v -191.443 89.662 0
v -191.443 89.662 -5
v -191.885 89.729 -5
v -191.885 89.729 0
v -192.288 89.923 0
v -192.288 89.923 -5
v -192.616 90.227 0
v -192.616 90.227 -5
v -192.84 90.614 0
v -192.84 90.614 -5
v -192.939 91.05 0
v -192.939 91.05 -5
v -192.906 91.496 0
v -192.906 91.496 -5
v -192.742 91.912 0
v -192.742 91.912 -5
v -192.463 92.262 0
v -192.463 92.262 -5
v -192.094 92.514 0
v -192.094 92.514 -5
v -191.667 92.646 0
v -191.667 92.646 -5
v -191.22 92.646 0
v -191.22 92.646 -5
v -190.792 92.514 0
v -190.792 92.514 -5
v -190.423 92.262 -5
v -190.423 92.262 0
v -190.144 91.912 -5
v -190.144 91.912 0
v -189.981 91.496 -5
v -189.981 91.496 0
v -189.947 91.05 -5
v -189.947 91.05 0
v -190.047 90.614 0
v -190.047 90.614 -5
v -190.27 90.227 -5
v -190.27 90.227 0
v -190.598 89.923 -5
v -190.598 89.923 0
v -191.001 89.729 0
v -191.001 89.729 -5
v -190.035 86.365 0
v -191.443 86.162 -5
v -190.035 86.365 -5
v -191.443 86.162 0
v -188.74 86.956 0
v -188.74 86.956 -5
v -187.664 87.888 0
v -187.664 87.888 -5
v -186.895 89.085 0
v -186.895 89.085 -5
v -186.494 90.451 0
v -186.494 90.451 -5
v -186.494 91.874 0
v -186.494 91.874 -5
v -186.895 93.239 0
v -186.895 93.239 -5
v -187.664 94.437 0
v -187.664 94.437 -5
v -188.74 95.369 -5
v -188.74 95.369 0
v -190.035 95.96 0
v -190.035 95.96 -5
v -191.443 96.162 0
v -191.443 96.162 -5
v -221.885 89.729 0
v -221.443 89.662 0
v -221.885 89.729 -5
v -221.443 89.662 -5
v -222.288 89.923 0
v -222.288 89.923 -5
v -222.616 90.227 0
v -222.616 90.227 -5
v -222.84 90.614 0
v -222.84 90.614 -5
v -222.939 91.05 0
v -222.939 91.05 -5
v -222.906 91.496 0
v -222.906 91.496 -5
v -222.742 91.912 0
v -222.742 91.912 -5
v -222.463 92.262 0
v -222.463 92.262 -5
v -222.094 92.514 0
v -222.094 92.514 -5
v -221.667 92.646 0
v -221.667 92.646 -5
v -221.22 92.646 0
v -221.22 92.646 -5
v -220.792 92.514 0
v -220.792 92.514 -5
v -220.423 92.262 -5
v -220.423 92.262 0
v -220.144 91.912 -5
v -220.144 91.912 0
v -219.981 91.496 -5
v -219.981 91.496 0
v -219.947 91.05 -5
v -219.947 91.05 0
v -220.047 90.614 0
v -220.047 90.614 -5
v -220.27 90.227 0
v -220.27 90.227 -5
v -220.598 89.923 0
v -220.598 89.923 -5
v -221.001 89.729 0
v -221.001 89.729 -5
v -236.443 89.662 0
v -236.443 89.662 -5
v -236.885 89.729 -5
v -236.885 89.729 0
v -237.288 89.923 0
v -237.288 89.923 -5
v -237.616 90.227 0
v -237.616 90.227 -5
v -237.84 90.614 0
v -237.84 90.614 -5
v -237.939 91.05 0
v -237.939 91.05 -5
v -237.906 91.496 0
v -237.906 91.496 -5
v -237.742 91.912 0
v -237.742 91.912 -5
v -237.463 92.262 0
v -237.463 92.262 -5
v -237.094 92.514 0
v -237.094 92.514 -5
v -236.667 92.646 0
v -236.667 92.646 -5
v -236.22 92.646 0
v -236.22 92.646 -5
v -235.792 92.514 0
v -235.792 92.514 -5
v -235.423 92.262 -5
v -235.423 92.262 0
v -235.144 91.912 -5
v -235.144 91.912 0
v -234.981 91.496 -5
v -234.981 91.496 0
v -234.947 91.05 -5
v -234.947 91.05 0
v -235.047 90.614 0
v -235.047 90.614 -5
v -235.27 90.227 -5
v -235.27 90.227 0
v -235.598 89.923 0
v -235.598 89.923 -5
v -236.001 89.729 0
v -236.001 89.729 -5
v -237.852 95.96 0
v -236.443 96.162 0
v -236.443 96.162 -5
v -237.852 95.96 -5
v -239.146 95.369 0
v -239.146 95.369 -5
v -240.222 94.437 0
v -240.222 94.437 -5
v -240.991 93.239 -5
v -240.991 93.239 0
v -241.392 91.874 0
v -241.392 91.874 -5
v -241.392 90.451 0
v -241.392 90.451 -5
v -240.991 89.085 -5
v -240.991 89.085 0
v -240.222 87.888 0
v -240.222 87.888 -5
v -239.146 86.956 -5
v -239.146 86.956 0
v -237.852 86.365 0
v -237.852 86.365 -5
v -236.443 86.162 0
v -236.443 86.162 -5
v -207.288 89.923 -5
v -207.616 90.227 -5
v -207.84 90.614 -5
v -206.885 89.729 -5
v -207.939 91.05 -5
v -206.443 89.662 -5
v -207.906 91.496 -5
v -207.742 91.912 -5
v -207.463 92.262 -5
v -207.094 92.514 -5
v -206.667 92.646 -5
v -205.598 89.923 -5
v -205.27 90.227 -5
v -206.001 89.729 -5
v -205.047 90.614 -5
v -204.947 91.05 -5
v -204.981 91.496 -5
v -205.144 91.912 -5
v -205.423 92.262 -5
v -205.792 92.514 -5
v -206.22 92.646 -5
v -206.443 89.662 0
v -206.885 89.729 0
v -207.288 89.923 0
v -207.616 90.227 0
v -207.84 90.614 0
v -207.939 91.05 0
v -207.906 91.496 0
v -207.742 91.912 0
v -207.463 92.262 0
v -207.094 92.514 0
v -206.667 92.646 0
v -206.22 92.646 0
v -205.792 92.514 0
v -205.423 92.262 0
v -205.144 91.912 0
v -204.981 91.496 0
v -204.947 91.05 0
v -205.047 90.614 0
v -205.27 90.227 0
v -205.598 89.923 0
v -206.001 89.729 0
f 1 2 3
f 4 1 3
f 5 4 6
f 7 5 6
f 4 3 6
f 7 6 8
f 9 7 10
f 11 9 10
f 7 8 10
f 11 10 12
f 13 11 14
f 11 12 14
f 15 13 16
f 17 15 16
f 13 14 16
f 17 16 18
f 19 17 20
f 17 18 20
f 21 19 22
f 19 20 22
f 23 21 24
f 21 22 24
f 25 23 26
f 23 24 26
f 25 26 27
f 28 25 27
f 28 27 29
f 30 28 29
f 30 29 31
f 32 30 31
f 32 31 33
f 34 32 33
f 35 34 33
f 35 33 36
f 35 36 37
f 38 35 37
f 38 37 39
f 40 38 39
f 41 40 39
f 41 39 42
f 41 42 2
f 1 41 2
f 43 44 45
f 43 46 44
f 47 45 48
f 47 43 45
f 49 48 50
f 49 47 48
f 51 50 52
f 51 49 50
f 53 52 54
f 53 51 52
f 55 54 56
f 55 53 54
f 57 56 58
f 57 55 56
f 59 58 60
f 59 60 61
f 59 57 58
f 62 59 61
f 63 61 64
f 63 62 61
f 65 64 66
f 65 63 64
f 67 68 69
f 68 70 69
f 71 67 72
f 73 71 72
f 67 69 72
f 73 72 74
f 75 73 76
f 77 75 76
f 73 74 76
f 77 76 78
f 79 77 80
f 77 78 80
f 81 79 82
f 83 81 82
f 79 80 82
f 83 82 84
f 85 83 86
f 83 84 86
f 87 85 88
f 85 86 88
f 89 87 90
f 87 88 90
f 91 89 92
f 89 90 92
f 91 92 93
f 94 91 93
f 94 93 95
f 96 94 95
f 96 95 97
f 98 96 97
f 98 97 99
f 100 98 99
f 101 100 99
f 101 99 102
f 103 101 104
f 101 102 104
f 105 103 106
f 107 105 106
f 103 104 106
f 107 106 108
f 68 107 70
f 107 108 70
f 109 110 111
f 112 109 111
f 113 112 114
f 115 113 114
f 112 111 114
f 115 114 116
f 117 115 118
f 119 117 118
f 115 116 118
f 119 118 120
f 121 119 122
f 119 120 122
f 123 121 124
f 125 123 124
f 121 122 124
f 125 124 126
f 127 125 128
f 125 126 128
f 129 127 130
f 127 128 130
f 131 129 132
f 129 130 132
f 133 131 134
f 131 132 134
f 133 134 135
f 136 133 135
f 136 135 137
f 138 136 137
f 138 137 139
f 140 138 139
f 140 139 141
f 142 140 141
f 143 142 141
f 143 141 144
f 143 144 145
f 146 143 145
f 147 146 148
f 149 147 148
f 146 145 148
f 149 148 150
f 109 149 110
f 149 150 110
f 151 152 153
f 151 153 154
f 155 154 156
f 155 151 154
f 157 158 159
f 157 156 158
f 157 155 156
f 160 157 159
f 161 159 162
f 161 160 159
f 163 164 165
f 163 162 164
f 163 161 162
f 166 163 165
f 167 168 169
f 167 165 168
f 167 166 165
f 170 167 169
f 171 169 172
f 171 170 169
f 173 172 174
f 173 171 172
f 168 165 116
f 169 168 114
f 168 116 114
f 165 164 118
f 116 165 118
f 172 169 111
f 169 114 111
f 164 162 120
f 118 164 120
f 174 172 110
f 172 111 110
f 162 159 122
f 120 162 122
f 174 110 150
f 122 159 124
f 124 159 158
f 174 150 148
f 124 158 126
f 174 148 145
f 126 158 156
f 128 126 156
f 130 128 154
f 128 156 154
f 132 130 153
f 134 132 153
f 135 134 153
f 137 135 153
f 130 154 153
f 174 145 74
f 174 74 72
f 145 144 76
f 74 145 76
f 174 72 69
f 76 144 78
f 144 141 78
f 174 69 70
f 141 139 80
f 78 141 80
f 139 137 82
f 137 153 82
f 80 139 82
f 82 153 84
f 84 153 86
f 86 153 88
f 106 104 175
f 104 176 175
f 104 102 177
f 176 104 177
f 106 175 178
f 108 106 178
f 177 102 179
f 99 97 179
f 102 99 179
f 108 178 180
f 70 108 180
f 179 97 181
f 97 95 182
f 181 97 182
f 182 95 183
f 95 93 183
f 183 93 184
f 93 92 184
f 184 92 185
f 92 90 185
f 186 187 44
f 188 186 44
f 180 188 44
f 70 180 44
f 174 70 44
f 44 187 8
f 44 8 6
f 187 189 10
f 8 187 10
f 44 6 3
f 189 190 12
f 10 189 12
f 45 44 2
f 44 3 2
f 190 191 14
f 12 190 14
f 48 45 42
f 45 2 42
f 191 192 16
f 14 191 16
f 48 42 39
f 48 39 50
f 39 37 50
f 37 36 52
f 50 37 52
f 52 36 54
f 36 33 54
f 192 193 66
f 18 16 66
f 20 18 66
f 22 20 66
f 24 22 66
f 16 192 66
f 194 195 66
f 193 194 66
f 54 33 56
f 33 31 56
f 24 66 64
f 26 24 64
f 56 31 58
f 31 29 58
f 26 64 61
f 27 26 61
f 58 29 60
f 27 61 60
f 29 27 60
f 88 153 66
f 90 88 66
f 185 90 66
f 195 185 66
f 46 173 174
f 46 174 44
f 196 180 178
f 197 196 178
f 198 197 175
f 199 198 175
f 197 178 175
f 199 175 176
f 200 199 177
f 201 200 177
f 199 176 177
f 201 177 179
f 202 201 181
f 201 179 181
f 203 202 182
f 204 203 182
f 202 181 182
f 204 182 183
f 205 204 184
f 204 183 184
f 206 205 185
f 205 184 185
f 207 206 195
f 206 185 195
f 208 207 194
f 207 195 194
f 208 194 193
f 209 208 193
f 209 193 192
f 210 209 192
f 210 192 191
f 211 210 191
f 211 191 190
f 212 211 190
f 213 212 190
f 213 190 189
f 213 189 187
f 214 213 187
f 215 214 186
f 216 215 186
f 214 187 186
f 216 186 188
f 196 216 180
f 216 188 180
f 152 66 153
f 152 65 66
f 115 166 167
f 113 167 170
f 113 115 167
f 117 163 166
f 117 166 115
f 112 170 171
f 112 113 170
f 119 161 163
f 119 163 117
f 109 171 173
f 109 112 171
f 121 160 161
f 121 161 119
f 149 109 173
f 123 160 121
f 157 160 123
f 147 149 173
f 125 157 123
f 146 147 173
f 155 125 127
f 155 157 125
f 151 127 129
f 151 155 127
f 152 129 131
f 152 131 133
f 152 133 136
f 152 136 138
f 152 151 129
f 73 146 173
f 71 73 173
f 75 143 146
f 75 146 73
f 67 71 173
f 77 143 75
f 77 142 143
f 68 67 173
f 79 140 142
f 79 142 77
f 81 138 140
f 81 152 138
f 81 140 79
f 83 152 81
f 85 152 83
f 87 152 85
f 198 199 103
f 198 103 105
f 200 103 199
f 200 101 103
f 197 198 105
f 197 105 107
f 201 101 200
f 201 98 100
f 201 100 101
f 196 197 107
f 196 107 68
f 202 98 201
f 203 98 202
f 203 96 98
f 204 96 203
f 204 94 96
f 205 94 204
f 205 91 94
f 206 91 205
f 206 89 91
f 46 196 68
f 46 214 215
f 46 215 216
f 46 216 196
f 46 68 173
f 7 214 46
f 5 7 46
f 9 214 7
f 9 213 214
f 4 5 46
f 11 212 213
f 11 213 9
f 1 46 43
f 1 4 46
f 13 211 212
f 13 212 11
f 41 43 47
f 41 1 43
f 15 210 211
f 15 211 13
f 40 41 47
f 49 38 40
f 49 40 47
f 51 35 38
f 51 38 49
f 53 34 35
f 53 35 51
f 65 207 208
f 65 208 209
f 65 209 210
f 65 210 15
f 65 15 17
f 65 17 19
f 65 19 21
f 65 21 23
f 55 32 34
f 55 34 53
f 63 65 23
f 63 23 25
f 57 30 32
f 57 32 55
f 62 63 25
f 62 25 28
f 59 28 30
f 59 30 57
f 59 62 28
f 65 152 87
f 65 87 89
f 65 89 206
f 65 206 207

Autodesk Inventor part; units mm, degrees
ref_plane "YZ Plane" through (0, 0, 0) normal (1, 0, 0) x (0, 1, 0)
ref_plane "XZ Plane" through (0, 0, 0) normal (0, 1, 0) x (-1, 0, 0)
ref_plane "XY Plane" through (0, 0, 0) normal (0, 0, 1) x (1, 0, 0)
sketch "スケッチ1" plane through (0, 0, 0) normal (0, 0, 1) x (1, 0, 0)
  circle A0 centre (-137.47813, 108.715013) radius 1.5
  circle A1 centre (-137.47813, 108.715013) radius 4
  circle A2 centre (-84.833891, 108.084965) radius 1.5
  circle A3 centre (-84.833891, 108.084965) radius 4
  arc A4 (-118.947299, 71.123436) -> (-117.73095, 71.382243) centre (-118.502117, 72.018876) ccw
  arc A5 (-114.600271, 73.907195) -> (-117.73095, 71.382243) centre (-110, 65) ccw
  arc A6 (-114.600271, 73.907195) -> (-114.089743, 75.041147) centre (-115.059151, 74.795694) ccw
  line L0 (-114.089743, 75.041147) -> (-119.33341, 95.750821)
  arc A7 (-119.33341, 95.750821) -> (-120.080809, 96.480412) centre (-120.302818, 95.505368) ccw
  arc A8 (-121.730917, 97.23053) -> (-120.080809, 96.480412) centre (-119.081767, 100.868113) ccw
  arc A9 (-121.730917, 97.23053) -> (-122.772044, 97.31398) centre (-122.319616, 96.422178) ccw
  line L1 (-122.772044, 97.31398) -> (-145.176978, 85.94755)
  arc A10 (-145.176978, 85.94755) -> (-145.169733, 84.160308) centre (-144.724551, 85.055748) ccw
  line L2 (-145.169733, 84.160308) -> (-118.947299, 71.123436)
  arc A11 (-111.181518, 75.777506) -> (-110.19287, 75.023145) centre (-110.212109, 76.022959) ccw
  arc A12 (-100.681376, 68.696468) -> (-110.19287, 75.023145) centre (-110, 65) ccw
  arc A13 (-100.681376, 68.696468) -> (-99.603497, 68.076257) centre (-99.751838, 69.065193) ccw
  line L3 (-99.603497, 68.076257) -> (-77.042446, 71.460414)
  arc A14 (-77.042446, 71.460414) -> (-76.670938, 73.303609) centre (-77.190786, 72.449351) ccw
  line L4 (-76.670938, 73.303609) -> (-114.637331, 96.407596)
  arc A15 (-114.637331, 96.407596) -> (-116.126588, 95.307885) centre (-115.15718, 95.553338) ccw
  line L5 (-116.126588, 95.307885) -> (-111.181518, 75.777506)
  circle A16 centre (-150.294817, 85.033166) radius 1.5
  arc A17 (-124.129325, 99.989384) -> (-123.581755, 100.878808) centre (-124.581752, 100.881185) ccw
  arc A18 (-114.594354, 100.531773) -> (-123.581755, 100.878808) centre (-119.081767, 100.868113) ccw
  arc A19 (-114.594354, 100.531773) -> (-114.117, 99.602773) centre (-113.597151, 100.457031) ccw
  line L6 (-114.117, 99.602773) -> (-73.405222, 74.828115)
  arc A20 (-73.405222, 74.828115) -> (-72.36076, 74.831033) centre (-72.885373, 75.682374) ccw
  arc A21 (-73.660486, 68.382589) -> (-72.36076, 74.831033) centre (-70, 71) ccw
  arc A22 (-73.660486, 68.382589) -> (-74.622268, 68.789879) centre (-74.473928, 67.800942) ccw
  line L7 (-74.622268, 68.789879) -> (-99.158476, 65.109447)
  arc A23 (-99.158476, 65.109447) -> (-100.006948, 64.200283) centre (-99.010135, 64.120511) ccw
  arc A24 (-119.754961, 67.311137) -> (-100.006948, 64.200283) centre (-110, 65) ccw
  arc A25 (-119.754961, 67.311137) -> (-120.282843, 68.437115) centre (-120.728025, 67.541674) ccw
  line L8 (-120.282843, 68.437115) -> (-147.085218, 81.762313)
  arc A26 (-147.085218, 81.762313) -> (-148.083283, 81.700131) centre (-147.5304, 80.866873) ccw
  arc A27 (-148.11038, 88.384022) -> (-148.083283, 81.700131) centre (-150.294817, 85.033166) ccw
  arc A28 (-148.11038, 88.384022) -> (-147.111844, 88.329935) centre (-147.564271, 89.221736) ccw
  line L9 (-147.111844, 88.329935) -> (-124.129325, 99.989384)
  circle A29 centre (-110, 65) radius 7.025
  circle A30 centre (-119.081767, 100.868113) radius 1.5
  circle A31 centre (-70, 71) radius 1.5
  line L10 (-330.399972, 95) -> (-110, 65)
  circle A32 centre (-156.443214, 91.162336) radius 4
  circle A33 centre (-136.470623, 92.209055) radius 4
  line L11 (0, 0) -> (-155.794817, 0)
  line L12 (-329.051247, 104.90863) -> (-108.651275, 74.90863)
  circle A34 centre (-156.443214, 91.162336) radius 9
  circle A35 centre (-136.470623, 92.209055) radius 6
  line L13 (-156.443214, 91.162336) -> (-136.470623, 92.209055)
  circle A36 centre (-110, 65) radius 65
  circle A37 centre (-191.443214, 91.162336) radius 5
  line L14 (-191.443214, 91.162336) -> (-156.443214, 91.162336)
  line L15 (-191.443214, 91.162336) -> (-206.443214, 91.162336)
  circle A38 centre (-206.443214, 91.162336) radius 5
  line L16 (-206.443214, 91.162336) -> (-221.443214, 91.162336)
  circle A39 centre (-221.443214, 91.162336) radius 5
  line L17 (-221.443214, 91.162336) -> (-236.443214, 91.162336)
  circle A40 centre (-236.443214, 91.162336) radius 5
  line L18 (-206.843214, 96.14631) -> (-157.163214, 100.133489)
  line L19 (-206.843214, 86.178361) -> (-157.163214, 82.191182)
  line L20 (-135.882319, 98.180143) -> (-155.560758, 100.118968)
  line L21 (-154.629369, 82.34701) -> (-135.261393, 86.332171)
  circle A41 centre (-206.443214, 91.162336) radius 1.5
  circle A42 centre (-191.443214, 91.162336) radius 1.5
  line L22 (-236.443214, 91.162336) -> (-191.443214, 91.162336) construction
  line L23 (-236.443214, 86.162336) -> (-191.443214, 86.162336)
  line L24 (-191.443214, 96.162336) -> (-236.443214, 96.162336)
  arc A43 (-236.443214, 96.162336) -> (-236.443214, 86.162336) centre (-236.443214, 91.162336) ccw
  arc A44 (-191.443214, 86.162336) -> (-191.443214, 96.162336) centre (-191.443214, 91.162336) ccw
  point P0 (-202.811763, 87.725395)
  point P1 (-169.324077, 83.167179)
  point P2 (-153.510113, 82.653698)
  point P3 (-153.460125, 82.587594)
  point P4 (-191.336809, 86.163468)
  point P5 (-192.881846, 86.373772)
  point P6 (-213.943214, 91.162336)
  dimension "d0" = 8
  dimension "d1" = 8
  dimension "d2" = 95
  dimension "d3" = 7.75125
  dimension "d4" = 10
  dimension "d5" = 18
  dimension "d6" = 12
  dimension "d7" = 20
  dimension "d8" = 3
  dimension "d9" = 130
  dimension "d10" = 10
  dimension "d11" = 35
  dimension "d12" = 15
  dimension "d13" = 10
  dimension "d14" = 15
  dimension "d15" = 10
  dimension "d16" = 15
  dimension "d17" = 10
  dimension "d18" = 3
  dimension "d19" = 3
  dimension "d20" = 10
extrude "押し出し1" add sketch "スケッチ1" against normal blind 5 contours A37 L12 | L12 A37 L15 A42 L14 | L23 A39 L12 A38 L19 | L19 A38 L23 | A37 L23 A38 L12 | L12 A38 L15 A37 | L14 A42 L15 A37 | A38 L12 | L23 A40 L17 L12 A39 | A39 L12 | L12 A38 L16 A41 L15 | L15 A38 L24 A37 | A42 L15 L14 | L14 L15 A42 | L24 A38 L18 | L18 A38 L16 A39 L24 | L12 A39 L16 A38 | A39 L17 L16 L12 | L12 L17 A39 | A40 L12 | L15 A41 L16 A38 | A39 L16 L17 | A39 L17 L12 A40 L24 | L17 A40 L12 | A40 L12 | A41 L16 L15 | L15 L16 A41
hole "穴1" at (-236.443214, 91.162336, 0) at (-221.443214, 91.162336, 0) at (-206.443214, 91.162336, 0) at (-191.443214, 91.162336, 0) direction (0, 0, -1) diameter 3 depth 12 tip angle 118
properties part number "カウンター 取り付け根元延長"
